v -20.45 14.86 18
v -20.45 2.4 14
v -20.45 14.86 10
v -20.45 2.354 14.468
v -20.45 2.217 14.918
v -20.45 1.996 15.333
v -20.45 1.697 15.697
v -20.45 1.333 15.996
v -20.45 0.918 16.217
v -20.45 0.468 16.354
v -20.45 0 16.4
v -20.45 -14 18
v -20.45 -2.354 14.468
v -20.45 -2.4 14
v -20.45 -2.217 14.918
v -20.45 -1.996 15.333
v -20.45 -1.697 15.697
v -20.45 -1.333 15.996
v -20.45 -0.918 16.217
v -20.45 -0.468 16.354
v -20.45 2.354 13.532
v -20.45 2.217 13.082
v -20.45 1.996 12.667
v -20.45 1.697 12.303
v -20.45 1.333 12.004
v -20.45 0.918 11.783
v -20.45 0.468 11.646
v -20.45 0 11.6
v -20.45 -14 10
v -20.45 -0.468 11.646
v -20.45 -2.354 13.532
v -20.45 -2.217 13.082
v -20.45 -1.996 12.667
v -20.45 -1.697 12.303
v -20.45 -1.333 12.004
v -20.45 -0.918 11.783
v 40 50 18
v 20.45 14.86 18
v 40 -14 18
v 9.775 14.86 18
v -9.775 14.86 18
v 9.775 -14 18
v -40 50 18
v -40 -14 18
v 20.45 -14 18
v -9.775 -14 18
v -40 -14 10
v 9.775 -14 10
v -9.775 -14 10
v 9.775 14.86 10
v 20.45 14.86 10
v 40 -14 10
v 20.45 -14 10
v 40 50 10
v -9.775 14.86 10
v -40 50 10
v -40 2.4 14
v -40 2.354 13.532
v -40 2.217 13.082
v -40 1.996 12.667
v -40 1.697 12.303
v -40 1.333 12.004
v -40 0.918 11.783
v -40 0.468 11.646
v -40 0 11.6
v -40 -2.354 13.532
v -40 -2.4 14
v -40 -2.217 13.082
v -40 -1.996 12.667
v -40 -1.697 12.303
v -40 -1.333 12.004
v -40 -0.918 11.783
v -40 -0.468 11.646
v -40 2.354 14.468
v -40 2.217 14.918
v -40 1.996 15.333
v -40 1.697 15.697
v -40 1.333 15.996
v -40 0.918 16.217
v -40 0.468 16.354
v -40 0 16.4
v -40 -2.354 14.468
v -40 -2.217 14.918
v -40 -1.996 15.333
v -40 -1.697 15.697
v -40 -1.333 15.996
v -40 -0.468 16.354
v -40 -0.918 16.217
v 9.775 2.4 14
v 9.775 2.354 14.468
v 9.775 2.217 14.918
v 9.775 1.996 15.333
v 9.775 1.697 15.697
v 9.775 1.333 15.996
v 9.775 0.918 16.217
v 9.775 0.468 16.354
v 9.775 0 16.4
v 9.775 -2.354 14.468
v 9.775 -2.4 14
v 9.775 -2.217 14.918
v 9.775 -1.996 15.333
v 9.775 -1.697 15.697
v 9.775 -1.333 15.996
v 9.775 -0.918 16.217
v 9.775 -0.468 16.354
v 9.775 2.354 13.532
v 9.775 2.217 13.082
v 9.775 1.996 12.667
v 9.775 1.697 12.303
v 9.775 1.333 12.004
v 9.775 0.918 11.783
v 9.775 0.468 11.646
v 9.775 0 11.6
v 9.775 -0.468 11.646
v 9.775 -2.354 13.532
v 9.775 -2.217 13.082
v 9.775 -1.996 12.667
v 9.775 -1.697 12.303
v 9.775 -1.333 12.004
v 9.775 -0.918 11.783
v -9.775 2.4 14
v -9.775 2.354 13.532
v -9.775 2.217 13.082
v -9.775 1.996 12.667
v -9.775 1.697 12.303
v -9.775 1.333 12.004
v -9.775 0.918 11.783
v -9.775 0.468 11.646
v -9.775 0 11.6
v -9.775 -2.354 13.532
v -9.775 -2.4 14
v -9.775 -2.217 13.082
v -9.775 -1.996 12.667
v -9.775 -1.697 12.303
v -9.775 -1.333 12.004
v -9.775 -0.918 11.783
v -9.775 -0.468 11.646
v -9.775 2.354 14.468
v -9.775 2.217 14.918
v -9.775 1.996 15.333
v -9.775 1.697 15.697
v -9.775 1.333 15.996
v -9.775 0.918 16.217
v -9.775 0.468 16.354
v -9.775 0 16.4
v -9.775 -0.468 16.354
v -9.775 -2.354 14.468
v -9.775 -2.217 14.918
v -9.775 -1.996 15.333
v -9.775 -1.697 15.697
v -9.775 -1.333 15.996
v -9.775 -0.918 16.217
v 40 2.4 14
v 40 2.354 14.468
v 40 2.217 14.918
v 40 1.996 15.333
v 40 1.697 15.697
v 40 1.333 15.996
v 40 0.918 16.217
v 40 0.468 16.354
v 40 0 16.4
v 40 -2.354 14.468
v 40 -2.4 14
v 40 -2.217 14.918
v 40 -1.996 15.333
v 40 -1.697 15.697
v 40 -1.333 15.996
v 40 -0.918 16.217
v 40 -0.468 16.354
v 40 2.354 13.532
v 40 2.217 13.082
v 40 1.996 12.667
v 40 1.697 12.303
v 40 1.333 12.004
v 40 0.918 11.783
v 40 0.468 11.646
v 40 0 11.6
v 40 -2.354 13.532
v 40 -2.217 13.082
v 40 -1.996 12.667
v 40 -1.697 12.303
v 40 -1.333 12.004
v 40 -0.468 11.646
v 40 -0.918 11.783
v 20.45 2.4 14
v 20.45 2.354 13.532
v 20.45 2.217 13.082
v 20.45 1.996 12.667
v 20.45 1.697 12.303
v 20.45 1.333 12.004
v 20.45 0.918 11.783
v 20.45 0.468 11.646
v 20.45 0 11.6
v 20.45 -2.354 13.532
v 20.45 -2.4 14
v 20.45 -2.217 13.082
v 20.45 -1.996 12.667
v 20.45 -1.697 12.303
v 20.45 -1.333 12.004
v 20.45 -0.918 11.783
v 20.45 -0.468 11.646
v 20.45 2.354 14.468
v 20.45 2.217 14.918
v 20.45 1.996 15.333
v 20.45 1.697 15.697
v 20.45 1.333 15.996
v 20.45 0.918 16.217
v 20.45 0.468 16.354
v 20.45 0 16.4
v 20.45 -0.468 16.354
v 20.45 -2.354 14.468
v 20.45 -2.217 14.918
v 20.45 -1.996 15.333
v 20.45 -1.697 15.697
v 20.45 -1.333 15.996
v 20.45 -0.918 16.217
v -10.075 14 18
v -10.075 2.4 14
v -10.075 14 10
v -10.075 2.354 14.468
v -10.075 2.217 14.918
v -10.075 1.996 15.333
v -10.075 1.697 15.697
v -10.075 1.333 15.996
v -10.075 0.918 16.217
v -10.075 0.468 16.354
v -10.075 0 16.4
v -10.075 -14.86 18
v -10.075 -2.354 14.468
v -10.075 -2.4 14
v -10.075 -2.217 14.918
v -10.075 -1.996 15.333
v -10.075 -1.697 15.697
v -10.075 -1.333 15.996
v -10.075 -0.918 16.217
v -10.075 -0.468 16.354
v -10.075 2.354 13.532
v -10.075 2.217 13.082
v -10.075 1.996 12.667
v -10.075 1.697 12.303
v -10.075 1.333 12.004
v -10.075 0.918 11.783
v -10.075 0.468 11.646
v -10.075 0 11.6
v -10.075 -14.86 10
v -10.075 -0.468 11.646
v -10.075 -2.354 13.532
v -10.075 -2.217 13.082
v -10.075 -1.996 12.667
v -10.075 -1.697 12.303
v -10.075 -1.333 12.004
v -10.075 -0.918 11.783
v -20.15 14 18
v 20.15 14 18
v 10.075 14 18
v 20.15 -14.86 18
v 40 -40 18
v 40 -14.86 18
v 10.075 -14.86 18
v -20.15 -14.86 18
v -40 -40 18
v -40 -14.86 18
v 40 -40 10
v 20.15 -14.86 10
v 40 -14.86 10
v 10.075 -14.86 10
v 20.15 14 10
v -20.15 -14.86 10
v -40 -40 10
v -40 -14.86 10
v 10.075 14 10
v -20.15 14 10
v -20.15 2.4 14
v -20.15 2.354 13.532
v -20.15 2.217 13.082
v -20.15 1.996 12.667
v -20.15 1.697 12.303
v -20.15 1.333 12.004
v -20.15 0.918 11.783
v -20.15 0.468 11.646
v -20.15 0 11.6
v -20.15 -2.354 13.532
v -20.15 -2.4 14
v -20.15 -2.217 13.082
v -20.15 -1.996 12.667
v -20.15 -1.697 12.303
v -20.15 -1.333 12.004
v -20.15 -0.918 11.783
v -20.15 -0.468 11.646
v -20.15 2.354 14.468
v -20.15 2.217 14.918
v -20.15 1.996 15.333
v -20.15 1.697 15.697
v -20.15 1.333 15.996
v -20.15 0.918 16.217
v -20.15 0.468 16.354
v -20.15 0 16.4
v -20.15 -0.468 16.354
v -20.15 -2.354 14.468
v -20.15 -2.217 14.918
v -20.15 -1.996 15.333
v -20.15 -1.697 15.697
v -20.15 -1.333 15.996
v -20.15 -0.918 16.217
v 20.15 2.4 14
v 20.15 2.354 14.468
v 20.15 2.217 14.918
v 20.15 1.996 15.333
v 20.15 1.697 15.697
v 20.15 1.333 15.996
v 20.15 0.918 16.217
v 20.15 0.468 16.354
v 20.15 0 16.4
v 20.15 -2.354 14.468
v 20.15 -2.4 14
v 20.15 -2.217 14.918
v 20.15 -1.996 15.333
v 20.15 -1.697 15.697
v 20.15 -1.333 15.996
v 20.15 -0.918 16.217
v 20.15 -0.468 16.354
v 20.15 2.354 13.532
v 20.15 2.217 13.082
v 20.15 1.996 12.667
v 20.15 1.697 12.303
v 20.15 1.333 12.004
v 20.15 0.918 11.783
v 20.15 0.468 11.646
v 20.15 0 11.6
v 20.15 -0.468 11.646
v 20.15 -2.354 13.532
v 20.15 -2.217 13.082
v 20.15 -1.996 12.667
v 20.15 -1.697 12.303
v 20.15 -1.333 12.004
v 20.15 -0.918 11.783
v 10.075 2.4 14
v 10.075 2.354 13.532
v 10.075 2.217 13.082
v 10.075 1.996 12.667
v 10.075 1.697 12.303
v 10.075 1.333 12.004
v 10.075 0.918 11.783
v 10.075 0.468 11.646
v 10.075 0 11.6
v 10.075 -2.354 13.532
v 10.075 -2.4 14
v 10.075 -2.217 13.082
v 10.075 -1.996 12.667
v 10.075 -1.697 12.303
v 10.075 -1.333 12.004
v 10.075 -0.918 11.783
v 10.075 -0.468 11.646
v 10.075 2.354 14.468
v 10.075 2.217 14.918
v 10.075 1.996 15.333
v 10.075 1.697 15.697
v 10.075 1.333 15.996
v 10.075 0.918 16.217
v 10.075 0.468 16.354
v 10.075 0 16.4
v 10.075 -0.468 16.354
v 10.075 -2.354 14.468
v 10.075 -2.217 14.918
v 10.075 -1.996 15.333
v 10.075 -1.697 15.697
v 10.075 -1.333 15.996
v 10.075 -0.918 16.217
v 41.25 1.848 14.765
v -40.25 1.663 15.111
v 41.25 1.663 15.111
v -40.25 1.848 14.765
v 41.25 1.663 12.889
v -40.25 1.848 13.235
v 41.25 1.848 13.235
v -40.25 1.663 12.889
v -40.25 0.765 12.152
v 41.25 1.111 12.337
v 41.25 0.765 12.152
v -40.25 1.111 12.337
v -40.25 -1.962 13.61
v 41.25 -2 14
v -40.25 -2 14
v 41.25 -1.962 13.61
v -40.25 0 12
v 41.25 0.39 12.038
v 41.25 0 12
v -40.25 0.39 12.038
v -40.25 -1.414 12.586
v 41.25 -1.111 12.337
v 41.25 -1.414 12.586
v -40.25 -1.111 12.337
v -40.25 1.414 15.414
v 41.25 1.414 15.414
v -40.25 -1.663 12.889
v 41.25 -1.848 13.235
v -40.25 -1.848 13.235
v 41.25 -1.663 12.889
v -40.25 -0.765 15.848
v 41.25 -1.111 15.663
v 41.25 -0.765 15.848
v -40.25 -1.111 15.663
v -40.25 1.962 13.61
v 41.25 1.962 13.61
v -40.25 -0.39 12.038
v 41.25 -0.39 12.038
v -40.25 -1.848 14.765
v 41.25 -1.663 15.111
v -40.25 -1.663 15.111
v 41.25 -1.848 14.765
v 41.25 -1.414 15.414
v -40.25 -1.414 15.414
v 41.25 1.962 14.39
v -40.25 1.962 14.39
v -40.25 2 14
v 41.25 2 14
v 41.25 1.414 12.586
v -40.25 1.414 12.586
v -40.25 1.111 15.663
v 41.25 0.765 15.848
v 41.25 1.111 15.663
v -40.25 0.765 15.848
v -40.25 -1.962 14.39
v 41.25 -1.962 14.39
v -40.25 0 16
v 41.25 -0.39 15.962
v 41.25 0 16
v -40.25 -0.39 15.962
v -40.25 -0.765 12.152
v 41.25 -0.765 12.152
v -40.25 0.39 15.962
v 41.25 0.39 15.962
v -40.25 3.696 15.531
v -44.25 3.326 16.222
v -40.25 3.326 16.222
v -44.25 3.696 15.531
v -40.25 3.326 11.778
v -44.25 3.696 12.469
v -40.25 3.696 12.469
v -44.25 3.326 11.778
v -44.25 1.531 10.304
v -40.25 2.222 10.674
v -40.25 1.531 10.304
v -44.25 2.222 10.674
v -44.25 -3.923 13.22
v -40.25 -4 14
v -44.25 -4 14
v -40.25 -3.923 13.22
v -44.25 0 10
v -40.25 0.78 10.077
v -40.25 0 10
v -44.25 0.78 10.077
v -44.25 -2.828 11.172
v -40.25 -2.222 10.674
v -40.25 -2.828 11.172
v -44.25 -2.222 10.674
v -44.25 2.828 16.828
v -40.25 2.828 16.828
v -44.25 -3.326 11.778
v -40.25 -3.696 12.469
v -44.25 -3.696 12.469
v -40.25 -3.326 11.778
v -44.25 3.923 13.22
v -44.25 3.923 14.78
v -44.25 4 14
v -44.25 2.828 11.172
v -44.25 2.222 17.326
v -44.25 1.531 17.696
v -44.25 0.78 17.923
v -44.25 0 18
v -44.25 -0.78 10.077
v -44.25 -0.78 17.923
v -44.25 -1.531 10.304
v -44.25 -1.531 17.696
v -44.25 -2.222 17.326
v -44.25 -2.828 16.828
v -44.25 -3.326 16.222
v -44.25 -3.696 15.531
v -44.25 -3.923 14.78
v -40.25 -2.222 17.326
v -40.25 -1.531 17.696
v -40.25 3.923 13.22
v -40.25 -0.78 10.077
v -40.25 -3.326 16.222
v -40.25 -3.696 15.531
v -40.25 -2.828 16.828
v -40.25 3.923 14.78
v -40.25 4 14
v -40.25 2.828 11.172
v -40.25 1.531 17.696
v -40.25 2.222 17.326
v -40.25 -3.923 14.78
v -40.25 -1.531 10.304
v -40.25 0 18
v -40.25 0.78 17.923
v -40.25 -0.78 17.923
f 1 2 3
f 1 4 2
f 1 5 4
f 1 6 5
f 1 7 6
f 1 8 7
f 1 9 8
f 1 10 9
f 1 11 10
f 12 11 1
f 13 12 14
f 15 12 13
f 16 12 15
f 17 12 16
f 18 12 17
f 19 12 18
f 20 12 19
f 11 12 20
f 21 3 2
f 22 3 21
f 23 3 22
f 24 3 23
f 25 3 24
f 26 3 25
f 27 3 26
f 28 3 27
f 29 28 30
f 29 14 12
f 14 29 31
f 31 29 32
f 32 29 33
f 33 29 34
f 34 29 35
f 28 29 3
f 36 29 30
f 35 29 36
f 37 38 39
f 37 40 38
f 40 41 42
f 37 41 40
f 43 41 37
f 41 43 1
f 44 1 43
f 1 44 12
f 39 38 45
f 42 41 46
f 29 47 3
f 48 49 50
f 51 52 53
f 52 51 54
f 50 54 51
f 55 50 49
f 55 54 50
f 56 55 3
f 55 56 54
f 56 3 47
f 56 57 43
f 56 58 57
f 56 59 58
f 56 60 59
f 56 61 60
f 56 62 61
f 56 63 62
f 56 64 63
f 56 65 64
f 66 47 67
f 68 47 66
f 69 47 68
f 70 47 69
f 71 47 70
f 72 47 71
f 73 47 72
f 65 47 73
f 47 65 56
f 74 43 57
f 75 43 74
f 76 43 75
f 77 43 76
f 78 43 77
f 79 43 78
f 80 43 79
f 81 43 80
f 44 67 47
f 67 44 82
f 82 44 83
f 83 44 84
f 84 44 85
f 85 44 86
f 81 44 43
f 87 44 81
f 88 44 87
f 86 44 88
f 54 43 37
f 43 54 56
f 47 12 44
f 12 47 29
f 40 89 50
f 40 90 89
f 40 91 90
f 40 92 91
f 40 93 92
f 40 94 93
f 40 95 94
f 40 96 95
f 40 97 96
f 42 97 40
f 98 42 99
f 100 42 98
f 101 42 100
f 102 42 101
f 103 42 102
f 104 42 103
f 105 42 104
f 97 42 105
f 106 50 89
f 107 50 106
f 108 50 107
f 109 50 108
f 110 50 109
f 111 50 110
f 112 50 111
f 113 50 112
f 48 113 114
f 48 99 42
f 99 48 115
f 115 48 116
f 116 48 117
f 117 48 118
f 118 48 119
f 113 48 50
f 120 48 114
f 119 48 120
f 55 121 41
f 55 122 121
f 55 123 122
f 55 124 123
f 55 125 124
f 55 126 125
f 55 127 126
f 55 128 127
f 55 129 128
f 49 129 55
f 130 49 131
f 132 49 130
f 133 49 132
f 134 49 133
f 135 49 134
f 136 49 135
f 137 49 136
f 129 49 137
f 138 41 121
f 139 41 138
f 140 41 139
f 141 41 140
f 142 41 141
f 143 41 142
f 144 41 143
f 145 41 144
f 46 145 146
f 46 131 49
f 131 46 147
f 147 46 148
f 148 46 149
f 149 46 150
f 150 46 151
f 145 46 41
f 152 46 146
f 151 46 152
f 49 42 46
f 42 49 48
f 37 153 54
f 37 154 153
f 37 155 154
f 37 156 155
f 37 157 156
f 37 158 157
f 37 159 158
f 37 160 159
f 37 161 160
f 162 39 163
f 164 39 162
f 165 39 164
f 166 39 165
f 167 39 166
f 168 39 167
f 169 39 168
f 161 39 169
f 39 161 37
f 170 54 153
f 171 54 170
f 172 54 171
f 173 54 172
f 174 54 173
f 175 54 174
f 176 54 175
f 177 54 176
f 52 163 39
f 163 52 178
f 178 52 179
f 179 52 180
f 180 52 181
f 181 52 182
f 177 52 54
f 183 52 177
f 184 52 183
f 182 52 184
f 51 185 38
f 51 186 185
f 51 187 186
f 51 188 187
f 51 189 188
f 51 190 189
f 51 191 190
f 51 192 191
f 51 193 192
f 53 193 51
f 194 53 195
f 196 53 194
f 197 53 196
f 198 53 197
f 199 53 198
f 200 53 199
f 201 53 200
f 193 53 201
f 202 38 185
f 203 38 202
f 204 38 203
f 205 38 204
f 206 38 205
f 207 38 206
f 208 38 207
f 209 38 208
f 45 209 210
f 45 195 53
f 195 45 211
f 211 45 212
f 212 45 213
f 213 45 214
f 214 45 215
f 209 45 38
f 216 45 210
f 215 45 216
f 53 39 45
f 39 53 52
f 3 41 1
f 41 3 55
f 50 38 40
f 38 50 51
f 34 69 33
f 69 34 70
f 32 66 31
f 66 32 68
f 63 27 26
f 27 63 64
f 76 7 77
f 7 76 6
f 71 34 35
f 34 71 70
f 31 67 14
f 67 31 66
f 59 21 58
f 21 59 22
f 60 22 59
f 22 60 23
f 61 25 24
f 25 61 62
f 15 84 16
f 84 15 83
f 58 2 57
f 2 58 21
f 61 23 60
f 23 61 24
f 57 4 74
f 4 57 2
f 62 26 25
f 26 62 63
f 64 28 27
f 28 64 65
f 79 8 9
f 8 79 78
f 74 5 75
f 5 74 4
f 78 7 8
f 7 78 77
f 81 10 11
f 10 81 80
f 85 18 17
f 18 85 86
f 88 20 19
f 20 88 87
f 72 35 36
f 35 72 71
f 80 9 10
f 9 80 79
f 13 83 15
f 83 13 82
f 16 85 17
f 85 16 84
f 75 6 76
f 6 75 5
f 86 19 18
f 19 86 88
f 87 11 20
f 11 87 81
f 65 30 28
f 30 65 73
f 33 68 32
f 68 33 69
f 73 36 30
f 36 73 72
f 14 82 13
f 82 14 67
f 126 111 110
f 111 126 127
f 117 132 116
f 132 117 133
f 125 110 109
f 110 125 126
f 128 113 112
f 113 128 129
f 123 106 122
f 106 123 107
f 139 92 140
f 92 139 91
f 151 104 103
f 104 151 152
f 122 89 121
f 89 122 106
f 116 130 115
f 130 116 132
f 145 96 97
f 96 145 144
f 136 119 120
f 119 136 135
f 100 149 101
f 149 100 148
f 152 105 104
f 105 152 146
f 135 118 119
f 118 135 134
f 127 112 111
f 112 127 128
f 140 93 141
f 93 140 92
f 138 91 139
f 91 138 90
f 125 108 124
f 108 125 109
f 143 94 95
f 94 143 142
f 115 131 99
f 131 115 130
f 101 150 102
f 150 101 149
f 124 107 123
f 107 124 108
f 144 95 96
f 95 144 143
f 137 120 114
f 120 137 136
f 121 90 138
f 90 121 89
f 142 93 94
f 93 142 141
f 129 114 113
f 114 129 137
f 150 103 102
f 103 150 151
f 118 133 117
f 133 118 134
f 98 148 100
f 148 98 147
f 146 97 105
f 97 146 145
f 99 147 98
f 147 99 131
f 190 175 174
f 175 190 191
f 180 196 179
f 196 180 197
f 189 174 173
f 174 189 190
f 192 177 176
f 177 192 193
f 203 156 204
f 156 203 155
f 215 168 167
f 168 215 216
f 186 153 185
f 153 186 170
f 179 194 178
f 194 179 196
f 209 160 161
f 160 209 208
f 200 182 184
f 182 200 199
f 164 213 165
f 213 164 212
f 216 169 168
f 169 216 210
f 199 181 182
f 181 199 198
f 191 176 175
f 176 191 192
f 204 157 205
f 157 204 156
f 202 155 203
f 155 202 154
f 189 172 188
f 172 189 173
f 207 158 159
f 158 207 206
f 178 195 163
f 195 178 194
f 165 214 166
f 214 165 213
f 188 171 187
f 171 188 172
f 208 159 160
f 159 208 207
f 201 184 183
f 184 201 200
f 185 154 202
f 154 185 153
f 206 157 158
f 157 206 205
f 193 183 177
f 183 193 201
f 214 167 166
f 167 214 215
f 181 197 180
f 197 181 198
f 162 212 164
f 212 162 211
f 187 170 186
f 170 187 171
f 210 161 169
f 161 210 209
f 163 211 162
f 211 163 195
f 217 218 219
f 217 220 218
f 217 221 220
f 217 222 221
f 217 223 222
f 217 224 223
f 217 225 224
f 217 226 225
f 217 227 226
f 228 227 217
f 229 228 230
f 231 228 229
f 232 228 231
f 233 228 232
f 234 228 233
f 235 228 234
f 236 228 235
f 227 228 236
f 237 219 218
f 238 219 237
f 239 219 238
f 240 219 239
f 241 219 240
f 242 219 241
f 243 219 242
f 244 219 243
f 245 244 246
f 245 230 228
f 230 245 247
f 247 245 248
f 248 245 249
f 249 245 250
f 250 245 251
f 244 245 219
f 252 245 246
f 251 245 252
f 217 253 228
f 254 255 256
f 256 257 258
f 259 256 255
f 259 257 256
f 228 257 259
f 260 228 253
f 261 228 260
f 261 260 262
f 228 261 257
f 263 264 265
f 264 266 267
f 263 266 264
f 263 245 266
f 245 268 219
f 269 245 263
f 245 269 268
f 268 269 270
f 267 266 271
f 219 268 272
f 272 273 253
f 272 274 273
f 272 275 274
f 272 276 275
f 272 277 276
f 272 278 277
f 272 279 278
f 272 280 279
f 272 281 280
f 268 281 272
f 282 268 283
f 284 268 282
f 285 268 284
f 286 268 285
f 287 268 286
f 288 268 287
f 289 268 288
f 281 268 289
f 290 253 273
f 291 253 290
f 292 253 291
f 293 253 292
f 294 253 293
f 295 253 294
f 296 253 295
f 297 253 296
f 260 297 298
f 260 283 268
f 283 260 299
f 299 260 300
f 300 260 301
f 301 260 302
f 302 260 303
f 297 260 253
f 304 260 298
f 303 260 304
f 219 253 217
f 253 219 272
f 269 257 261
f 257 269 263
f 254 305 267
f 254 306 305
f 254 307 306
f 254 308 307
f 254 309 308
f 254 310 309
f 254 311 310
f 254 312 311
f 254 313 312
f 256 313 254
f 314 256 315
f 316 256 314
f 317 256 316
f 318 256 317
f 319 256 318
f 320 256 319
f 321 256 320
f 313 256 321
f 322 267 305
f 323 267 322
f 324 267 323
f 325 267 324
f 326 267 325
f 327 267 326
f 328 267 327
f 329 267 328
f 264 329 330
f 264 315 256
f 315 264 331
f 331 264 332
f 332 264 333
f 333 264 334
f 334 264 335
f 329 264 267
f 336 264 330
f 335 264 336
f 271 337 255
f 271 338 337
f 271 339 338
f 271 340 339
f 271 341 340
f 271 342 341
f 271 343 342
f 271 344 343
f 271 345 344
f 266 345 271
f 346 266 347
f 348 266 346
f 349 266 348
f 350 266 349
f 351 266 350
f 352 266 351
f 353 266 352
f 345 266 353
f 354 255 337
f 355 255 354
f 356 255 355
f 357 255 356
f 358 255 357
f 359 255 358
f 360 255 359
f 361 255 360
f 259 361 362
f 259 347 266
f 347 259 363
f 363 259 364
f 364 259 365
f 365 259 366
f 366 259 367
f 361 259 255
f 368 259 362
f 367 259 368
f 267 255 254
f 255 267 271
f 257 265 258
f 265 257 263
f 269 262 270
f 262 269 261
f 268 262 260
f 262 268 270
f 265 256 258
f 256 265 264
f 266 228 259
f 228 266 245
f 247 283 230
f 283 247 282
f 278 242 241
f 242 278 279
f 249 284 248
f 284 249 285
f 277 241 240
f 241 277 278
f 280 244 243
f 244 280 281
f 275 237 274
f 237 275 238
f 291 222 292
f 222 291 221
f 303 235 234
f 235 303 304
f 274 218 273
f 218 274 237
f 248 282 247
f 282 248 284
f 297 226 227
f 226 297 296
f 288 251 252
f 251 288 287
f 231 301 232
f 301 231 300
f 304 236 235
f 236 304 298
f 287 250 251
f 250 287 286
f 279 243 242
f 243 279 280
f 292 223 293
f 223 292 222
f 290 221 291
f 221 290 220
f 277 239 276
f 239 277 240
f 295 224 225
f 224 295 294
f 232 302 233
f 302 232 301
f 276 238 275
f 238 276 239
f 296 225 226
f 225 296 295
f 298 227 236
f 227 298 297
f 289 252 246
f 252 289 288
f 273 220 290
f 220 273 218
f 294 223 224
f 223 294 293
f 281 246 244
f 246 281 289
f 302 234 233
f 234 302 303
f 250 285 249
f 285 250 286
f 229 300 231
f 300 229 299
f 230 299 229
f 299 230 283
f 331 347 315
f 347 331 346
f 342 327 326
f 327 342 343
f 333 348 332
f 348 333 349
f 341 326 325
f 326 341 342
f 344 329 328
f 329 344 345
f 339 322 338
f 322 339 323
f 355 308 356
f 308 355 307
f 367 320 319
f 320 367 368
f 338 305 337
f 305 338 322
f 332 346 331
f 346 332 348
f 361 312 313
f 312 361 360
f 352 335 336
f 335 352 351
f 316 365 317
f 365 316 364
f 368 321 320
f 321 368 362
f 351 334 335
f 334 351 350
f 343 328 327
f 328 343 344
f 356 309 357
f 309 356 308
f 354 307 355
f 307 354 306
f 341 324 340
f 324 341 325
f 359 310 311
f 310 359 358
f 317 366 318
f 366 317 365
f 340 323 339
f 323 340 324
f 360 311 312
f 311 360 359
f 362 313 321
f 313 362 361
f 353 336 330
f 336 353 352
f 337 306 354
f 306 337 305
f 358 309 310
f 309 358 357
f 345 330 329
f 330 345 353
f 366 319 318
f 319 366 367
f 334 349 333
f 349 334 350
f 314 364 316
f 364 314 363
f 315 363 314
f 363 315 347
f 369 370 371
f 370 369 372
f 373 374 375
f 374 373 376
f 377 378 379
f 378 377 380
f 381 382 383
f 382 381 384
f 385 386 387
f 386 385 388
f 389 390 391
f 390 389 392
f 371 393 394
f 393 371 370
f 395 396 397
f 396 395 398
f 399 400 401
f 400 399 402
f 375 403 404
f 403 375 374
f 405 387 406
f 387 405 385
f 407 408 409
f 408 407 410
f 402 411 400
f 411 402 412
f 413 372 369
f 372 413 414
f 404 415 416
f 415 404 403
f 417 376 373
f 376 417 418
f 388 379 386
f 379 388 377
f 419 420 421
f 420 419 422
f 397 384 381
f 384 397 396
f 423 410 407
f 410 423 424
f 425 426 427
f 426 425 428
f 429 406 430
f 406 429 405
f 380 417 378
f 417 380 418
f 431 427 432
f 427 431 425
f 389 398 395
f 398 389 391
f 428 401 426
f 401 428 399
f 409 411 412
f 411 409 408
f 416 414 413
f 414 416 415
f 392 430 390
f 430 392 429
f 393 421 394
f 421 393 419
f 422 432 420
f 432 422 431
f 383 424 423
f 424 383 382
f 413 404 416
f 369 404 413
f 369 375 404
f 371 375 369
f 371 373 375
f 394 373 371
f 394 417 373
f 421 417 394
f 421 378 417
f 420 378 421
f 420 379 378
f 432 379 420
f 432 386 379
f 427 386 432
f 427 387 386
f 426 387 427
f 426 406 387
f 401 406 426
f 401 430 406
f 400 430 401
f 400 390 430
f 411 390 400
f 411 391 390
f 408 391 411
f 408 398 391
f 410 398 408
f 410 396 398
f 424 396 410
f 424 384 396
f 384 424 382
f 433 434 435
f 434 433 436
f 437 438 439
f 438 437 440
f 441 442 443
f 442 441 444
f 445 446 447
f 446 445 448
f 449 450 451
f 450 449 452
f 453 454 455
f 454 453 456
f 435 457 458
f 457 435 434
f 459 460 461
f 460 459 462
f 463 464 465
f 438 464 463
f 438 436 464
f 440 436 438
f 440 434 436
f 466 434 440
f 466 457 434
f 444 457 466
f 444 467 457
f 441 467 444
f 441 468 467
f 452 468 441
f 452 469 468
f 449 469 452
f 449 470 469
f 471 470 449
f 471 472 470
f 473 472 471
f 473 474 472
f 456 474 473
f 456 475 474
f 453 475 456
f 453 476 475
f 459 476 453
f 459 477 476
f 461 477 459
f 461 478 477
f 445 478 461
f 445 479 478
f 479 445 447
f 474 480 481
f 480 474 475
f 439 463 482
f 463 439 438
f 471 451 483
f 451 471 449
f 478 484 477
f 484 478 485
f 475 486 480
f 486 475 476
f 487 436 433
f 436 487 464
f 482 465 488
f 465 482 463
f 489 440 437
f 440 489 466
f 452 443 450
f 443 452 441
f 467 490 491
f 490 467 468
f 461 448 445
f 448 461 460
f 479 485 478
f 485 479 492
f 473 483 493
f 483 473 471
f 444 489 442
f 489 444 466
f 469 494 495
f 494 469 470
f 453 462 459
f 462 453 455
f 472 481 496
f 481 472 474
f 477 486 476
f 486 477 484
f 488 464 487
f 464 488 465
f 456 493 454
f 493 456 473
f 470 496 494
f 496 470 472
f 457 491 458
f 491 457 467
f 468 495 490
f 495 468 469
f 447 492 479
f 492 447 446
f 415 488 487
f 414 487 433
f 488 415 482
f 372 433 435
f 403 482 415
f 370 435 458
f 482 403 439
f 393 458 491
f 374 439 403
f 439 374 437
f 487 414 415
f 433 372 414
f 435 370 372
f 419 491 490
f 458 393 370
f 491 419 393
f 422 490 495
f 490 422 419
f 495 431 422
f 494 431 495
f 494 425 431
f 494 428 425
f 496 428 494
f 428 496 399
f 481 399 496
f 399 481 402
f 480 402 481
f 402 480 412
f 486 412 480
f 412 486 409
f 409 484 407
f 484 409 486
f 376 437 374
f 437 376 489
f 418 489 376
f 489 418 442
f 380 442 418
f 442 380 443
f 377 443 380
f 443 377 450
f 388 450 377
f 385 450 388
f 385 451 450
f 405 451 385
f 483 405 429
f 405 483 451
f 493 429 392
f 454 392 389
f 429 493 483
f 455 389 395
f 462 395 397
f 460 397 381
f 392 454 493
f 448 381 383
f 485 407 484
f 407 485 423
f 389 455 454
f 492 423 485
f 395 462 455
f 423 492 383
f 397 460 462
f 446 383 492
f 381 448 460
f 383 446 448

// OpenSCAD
$fn = 32;

// ------------------------------------------------------------------------
// Butt hinge: hinge 80 mm, leaf swung 0 deg
// Every part is its own module, assembly() places every instance.
// ------------------------------------------------------------------------

// --- part 1 ---
module hinge_base() {
  difference() {
    union() {
      translate([-40, -14, -4]) cube([19.55, 64, 8]);
      translate([-9.775, -14, -4]) cube([19.55, 64, 8]);
      translate([20.45, -14, -4]) cube([19.55, 64, 8]);
      translate([-40, 14.86, -4]) cube([80, 35.14, 8]);
    }
    translate([-30.225, 0, 0]) rotate([0, 90, 0]) cylinder(h = 21.55, d = 4.8, center = true);
    translate([0, 0, 0]) rotate([0, 90, 0]) cylinder(h = 21.55, d = 4.8, center = true);
    translate([30.225, 0, 0]) rotate([0, 90, 0]) cylinder(h = 21.55, d = 4.8, center = true);
  }
}

// --- part 2 ---
module hinge_mover() {
  difference() {
    union() {
      translate([-20.15, -40, -4]) cube([10.075, 54, 8]);
      translate([10.075, -40, -4]) cube([10.075, 54, 8]);
      translate([-40, -40, -4]) cube([80, 25.14, 8]);
    }
    translate([-15.113, 0, 0]) rotate([0, 90, 0]) cylinder(h = 12.075, d = 4.8, center = true);
    translate([15.113, 0, 0]) rotate([0, 90, 0]) cylinder(h = 12.075, d = 4.8, center = true);
  }
}

// --- part 3 ---
module hinge_pin() {
  rotate([0, 90, 0]) cylinder(h = 82.5, d = 4, center = true);
  translate([-44.25, 0, 0]) rotate([0, 90, 0]) cylinder(h = 4, d = 8);
}

// --- assembly ---
module assembly() {
  color([0.80, 0.24, 0.20]) translate([0, 0, 14]) rotate([0, 0, 0]) hinge_base();
  color([0.20, 0.45, 0.75]) translate([0, 0, 14]) rotate([0, 0, 0]) hinge_mover();
  color([0.25, 0.62, 0.32]) translate([0, 0, 14]) rotate([0, 0, 0]) hinge_pin();
}

assembly();
